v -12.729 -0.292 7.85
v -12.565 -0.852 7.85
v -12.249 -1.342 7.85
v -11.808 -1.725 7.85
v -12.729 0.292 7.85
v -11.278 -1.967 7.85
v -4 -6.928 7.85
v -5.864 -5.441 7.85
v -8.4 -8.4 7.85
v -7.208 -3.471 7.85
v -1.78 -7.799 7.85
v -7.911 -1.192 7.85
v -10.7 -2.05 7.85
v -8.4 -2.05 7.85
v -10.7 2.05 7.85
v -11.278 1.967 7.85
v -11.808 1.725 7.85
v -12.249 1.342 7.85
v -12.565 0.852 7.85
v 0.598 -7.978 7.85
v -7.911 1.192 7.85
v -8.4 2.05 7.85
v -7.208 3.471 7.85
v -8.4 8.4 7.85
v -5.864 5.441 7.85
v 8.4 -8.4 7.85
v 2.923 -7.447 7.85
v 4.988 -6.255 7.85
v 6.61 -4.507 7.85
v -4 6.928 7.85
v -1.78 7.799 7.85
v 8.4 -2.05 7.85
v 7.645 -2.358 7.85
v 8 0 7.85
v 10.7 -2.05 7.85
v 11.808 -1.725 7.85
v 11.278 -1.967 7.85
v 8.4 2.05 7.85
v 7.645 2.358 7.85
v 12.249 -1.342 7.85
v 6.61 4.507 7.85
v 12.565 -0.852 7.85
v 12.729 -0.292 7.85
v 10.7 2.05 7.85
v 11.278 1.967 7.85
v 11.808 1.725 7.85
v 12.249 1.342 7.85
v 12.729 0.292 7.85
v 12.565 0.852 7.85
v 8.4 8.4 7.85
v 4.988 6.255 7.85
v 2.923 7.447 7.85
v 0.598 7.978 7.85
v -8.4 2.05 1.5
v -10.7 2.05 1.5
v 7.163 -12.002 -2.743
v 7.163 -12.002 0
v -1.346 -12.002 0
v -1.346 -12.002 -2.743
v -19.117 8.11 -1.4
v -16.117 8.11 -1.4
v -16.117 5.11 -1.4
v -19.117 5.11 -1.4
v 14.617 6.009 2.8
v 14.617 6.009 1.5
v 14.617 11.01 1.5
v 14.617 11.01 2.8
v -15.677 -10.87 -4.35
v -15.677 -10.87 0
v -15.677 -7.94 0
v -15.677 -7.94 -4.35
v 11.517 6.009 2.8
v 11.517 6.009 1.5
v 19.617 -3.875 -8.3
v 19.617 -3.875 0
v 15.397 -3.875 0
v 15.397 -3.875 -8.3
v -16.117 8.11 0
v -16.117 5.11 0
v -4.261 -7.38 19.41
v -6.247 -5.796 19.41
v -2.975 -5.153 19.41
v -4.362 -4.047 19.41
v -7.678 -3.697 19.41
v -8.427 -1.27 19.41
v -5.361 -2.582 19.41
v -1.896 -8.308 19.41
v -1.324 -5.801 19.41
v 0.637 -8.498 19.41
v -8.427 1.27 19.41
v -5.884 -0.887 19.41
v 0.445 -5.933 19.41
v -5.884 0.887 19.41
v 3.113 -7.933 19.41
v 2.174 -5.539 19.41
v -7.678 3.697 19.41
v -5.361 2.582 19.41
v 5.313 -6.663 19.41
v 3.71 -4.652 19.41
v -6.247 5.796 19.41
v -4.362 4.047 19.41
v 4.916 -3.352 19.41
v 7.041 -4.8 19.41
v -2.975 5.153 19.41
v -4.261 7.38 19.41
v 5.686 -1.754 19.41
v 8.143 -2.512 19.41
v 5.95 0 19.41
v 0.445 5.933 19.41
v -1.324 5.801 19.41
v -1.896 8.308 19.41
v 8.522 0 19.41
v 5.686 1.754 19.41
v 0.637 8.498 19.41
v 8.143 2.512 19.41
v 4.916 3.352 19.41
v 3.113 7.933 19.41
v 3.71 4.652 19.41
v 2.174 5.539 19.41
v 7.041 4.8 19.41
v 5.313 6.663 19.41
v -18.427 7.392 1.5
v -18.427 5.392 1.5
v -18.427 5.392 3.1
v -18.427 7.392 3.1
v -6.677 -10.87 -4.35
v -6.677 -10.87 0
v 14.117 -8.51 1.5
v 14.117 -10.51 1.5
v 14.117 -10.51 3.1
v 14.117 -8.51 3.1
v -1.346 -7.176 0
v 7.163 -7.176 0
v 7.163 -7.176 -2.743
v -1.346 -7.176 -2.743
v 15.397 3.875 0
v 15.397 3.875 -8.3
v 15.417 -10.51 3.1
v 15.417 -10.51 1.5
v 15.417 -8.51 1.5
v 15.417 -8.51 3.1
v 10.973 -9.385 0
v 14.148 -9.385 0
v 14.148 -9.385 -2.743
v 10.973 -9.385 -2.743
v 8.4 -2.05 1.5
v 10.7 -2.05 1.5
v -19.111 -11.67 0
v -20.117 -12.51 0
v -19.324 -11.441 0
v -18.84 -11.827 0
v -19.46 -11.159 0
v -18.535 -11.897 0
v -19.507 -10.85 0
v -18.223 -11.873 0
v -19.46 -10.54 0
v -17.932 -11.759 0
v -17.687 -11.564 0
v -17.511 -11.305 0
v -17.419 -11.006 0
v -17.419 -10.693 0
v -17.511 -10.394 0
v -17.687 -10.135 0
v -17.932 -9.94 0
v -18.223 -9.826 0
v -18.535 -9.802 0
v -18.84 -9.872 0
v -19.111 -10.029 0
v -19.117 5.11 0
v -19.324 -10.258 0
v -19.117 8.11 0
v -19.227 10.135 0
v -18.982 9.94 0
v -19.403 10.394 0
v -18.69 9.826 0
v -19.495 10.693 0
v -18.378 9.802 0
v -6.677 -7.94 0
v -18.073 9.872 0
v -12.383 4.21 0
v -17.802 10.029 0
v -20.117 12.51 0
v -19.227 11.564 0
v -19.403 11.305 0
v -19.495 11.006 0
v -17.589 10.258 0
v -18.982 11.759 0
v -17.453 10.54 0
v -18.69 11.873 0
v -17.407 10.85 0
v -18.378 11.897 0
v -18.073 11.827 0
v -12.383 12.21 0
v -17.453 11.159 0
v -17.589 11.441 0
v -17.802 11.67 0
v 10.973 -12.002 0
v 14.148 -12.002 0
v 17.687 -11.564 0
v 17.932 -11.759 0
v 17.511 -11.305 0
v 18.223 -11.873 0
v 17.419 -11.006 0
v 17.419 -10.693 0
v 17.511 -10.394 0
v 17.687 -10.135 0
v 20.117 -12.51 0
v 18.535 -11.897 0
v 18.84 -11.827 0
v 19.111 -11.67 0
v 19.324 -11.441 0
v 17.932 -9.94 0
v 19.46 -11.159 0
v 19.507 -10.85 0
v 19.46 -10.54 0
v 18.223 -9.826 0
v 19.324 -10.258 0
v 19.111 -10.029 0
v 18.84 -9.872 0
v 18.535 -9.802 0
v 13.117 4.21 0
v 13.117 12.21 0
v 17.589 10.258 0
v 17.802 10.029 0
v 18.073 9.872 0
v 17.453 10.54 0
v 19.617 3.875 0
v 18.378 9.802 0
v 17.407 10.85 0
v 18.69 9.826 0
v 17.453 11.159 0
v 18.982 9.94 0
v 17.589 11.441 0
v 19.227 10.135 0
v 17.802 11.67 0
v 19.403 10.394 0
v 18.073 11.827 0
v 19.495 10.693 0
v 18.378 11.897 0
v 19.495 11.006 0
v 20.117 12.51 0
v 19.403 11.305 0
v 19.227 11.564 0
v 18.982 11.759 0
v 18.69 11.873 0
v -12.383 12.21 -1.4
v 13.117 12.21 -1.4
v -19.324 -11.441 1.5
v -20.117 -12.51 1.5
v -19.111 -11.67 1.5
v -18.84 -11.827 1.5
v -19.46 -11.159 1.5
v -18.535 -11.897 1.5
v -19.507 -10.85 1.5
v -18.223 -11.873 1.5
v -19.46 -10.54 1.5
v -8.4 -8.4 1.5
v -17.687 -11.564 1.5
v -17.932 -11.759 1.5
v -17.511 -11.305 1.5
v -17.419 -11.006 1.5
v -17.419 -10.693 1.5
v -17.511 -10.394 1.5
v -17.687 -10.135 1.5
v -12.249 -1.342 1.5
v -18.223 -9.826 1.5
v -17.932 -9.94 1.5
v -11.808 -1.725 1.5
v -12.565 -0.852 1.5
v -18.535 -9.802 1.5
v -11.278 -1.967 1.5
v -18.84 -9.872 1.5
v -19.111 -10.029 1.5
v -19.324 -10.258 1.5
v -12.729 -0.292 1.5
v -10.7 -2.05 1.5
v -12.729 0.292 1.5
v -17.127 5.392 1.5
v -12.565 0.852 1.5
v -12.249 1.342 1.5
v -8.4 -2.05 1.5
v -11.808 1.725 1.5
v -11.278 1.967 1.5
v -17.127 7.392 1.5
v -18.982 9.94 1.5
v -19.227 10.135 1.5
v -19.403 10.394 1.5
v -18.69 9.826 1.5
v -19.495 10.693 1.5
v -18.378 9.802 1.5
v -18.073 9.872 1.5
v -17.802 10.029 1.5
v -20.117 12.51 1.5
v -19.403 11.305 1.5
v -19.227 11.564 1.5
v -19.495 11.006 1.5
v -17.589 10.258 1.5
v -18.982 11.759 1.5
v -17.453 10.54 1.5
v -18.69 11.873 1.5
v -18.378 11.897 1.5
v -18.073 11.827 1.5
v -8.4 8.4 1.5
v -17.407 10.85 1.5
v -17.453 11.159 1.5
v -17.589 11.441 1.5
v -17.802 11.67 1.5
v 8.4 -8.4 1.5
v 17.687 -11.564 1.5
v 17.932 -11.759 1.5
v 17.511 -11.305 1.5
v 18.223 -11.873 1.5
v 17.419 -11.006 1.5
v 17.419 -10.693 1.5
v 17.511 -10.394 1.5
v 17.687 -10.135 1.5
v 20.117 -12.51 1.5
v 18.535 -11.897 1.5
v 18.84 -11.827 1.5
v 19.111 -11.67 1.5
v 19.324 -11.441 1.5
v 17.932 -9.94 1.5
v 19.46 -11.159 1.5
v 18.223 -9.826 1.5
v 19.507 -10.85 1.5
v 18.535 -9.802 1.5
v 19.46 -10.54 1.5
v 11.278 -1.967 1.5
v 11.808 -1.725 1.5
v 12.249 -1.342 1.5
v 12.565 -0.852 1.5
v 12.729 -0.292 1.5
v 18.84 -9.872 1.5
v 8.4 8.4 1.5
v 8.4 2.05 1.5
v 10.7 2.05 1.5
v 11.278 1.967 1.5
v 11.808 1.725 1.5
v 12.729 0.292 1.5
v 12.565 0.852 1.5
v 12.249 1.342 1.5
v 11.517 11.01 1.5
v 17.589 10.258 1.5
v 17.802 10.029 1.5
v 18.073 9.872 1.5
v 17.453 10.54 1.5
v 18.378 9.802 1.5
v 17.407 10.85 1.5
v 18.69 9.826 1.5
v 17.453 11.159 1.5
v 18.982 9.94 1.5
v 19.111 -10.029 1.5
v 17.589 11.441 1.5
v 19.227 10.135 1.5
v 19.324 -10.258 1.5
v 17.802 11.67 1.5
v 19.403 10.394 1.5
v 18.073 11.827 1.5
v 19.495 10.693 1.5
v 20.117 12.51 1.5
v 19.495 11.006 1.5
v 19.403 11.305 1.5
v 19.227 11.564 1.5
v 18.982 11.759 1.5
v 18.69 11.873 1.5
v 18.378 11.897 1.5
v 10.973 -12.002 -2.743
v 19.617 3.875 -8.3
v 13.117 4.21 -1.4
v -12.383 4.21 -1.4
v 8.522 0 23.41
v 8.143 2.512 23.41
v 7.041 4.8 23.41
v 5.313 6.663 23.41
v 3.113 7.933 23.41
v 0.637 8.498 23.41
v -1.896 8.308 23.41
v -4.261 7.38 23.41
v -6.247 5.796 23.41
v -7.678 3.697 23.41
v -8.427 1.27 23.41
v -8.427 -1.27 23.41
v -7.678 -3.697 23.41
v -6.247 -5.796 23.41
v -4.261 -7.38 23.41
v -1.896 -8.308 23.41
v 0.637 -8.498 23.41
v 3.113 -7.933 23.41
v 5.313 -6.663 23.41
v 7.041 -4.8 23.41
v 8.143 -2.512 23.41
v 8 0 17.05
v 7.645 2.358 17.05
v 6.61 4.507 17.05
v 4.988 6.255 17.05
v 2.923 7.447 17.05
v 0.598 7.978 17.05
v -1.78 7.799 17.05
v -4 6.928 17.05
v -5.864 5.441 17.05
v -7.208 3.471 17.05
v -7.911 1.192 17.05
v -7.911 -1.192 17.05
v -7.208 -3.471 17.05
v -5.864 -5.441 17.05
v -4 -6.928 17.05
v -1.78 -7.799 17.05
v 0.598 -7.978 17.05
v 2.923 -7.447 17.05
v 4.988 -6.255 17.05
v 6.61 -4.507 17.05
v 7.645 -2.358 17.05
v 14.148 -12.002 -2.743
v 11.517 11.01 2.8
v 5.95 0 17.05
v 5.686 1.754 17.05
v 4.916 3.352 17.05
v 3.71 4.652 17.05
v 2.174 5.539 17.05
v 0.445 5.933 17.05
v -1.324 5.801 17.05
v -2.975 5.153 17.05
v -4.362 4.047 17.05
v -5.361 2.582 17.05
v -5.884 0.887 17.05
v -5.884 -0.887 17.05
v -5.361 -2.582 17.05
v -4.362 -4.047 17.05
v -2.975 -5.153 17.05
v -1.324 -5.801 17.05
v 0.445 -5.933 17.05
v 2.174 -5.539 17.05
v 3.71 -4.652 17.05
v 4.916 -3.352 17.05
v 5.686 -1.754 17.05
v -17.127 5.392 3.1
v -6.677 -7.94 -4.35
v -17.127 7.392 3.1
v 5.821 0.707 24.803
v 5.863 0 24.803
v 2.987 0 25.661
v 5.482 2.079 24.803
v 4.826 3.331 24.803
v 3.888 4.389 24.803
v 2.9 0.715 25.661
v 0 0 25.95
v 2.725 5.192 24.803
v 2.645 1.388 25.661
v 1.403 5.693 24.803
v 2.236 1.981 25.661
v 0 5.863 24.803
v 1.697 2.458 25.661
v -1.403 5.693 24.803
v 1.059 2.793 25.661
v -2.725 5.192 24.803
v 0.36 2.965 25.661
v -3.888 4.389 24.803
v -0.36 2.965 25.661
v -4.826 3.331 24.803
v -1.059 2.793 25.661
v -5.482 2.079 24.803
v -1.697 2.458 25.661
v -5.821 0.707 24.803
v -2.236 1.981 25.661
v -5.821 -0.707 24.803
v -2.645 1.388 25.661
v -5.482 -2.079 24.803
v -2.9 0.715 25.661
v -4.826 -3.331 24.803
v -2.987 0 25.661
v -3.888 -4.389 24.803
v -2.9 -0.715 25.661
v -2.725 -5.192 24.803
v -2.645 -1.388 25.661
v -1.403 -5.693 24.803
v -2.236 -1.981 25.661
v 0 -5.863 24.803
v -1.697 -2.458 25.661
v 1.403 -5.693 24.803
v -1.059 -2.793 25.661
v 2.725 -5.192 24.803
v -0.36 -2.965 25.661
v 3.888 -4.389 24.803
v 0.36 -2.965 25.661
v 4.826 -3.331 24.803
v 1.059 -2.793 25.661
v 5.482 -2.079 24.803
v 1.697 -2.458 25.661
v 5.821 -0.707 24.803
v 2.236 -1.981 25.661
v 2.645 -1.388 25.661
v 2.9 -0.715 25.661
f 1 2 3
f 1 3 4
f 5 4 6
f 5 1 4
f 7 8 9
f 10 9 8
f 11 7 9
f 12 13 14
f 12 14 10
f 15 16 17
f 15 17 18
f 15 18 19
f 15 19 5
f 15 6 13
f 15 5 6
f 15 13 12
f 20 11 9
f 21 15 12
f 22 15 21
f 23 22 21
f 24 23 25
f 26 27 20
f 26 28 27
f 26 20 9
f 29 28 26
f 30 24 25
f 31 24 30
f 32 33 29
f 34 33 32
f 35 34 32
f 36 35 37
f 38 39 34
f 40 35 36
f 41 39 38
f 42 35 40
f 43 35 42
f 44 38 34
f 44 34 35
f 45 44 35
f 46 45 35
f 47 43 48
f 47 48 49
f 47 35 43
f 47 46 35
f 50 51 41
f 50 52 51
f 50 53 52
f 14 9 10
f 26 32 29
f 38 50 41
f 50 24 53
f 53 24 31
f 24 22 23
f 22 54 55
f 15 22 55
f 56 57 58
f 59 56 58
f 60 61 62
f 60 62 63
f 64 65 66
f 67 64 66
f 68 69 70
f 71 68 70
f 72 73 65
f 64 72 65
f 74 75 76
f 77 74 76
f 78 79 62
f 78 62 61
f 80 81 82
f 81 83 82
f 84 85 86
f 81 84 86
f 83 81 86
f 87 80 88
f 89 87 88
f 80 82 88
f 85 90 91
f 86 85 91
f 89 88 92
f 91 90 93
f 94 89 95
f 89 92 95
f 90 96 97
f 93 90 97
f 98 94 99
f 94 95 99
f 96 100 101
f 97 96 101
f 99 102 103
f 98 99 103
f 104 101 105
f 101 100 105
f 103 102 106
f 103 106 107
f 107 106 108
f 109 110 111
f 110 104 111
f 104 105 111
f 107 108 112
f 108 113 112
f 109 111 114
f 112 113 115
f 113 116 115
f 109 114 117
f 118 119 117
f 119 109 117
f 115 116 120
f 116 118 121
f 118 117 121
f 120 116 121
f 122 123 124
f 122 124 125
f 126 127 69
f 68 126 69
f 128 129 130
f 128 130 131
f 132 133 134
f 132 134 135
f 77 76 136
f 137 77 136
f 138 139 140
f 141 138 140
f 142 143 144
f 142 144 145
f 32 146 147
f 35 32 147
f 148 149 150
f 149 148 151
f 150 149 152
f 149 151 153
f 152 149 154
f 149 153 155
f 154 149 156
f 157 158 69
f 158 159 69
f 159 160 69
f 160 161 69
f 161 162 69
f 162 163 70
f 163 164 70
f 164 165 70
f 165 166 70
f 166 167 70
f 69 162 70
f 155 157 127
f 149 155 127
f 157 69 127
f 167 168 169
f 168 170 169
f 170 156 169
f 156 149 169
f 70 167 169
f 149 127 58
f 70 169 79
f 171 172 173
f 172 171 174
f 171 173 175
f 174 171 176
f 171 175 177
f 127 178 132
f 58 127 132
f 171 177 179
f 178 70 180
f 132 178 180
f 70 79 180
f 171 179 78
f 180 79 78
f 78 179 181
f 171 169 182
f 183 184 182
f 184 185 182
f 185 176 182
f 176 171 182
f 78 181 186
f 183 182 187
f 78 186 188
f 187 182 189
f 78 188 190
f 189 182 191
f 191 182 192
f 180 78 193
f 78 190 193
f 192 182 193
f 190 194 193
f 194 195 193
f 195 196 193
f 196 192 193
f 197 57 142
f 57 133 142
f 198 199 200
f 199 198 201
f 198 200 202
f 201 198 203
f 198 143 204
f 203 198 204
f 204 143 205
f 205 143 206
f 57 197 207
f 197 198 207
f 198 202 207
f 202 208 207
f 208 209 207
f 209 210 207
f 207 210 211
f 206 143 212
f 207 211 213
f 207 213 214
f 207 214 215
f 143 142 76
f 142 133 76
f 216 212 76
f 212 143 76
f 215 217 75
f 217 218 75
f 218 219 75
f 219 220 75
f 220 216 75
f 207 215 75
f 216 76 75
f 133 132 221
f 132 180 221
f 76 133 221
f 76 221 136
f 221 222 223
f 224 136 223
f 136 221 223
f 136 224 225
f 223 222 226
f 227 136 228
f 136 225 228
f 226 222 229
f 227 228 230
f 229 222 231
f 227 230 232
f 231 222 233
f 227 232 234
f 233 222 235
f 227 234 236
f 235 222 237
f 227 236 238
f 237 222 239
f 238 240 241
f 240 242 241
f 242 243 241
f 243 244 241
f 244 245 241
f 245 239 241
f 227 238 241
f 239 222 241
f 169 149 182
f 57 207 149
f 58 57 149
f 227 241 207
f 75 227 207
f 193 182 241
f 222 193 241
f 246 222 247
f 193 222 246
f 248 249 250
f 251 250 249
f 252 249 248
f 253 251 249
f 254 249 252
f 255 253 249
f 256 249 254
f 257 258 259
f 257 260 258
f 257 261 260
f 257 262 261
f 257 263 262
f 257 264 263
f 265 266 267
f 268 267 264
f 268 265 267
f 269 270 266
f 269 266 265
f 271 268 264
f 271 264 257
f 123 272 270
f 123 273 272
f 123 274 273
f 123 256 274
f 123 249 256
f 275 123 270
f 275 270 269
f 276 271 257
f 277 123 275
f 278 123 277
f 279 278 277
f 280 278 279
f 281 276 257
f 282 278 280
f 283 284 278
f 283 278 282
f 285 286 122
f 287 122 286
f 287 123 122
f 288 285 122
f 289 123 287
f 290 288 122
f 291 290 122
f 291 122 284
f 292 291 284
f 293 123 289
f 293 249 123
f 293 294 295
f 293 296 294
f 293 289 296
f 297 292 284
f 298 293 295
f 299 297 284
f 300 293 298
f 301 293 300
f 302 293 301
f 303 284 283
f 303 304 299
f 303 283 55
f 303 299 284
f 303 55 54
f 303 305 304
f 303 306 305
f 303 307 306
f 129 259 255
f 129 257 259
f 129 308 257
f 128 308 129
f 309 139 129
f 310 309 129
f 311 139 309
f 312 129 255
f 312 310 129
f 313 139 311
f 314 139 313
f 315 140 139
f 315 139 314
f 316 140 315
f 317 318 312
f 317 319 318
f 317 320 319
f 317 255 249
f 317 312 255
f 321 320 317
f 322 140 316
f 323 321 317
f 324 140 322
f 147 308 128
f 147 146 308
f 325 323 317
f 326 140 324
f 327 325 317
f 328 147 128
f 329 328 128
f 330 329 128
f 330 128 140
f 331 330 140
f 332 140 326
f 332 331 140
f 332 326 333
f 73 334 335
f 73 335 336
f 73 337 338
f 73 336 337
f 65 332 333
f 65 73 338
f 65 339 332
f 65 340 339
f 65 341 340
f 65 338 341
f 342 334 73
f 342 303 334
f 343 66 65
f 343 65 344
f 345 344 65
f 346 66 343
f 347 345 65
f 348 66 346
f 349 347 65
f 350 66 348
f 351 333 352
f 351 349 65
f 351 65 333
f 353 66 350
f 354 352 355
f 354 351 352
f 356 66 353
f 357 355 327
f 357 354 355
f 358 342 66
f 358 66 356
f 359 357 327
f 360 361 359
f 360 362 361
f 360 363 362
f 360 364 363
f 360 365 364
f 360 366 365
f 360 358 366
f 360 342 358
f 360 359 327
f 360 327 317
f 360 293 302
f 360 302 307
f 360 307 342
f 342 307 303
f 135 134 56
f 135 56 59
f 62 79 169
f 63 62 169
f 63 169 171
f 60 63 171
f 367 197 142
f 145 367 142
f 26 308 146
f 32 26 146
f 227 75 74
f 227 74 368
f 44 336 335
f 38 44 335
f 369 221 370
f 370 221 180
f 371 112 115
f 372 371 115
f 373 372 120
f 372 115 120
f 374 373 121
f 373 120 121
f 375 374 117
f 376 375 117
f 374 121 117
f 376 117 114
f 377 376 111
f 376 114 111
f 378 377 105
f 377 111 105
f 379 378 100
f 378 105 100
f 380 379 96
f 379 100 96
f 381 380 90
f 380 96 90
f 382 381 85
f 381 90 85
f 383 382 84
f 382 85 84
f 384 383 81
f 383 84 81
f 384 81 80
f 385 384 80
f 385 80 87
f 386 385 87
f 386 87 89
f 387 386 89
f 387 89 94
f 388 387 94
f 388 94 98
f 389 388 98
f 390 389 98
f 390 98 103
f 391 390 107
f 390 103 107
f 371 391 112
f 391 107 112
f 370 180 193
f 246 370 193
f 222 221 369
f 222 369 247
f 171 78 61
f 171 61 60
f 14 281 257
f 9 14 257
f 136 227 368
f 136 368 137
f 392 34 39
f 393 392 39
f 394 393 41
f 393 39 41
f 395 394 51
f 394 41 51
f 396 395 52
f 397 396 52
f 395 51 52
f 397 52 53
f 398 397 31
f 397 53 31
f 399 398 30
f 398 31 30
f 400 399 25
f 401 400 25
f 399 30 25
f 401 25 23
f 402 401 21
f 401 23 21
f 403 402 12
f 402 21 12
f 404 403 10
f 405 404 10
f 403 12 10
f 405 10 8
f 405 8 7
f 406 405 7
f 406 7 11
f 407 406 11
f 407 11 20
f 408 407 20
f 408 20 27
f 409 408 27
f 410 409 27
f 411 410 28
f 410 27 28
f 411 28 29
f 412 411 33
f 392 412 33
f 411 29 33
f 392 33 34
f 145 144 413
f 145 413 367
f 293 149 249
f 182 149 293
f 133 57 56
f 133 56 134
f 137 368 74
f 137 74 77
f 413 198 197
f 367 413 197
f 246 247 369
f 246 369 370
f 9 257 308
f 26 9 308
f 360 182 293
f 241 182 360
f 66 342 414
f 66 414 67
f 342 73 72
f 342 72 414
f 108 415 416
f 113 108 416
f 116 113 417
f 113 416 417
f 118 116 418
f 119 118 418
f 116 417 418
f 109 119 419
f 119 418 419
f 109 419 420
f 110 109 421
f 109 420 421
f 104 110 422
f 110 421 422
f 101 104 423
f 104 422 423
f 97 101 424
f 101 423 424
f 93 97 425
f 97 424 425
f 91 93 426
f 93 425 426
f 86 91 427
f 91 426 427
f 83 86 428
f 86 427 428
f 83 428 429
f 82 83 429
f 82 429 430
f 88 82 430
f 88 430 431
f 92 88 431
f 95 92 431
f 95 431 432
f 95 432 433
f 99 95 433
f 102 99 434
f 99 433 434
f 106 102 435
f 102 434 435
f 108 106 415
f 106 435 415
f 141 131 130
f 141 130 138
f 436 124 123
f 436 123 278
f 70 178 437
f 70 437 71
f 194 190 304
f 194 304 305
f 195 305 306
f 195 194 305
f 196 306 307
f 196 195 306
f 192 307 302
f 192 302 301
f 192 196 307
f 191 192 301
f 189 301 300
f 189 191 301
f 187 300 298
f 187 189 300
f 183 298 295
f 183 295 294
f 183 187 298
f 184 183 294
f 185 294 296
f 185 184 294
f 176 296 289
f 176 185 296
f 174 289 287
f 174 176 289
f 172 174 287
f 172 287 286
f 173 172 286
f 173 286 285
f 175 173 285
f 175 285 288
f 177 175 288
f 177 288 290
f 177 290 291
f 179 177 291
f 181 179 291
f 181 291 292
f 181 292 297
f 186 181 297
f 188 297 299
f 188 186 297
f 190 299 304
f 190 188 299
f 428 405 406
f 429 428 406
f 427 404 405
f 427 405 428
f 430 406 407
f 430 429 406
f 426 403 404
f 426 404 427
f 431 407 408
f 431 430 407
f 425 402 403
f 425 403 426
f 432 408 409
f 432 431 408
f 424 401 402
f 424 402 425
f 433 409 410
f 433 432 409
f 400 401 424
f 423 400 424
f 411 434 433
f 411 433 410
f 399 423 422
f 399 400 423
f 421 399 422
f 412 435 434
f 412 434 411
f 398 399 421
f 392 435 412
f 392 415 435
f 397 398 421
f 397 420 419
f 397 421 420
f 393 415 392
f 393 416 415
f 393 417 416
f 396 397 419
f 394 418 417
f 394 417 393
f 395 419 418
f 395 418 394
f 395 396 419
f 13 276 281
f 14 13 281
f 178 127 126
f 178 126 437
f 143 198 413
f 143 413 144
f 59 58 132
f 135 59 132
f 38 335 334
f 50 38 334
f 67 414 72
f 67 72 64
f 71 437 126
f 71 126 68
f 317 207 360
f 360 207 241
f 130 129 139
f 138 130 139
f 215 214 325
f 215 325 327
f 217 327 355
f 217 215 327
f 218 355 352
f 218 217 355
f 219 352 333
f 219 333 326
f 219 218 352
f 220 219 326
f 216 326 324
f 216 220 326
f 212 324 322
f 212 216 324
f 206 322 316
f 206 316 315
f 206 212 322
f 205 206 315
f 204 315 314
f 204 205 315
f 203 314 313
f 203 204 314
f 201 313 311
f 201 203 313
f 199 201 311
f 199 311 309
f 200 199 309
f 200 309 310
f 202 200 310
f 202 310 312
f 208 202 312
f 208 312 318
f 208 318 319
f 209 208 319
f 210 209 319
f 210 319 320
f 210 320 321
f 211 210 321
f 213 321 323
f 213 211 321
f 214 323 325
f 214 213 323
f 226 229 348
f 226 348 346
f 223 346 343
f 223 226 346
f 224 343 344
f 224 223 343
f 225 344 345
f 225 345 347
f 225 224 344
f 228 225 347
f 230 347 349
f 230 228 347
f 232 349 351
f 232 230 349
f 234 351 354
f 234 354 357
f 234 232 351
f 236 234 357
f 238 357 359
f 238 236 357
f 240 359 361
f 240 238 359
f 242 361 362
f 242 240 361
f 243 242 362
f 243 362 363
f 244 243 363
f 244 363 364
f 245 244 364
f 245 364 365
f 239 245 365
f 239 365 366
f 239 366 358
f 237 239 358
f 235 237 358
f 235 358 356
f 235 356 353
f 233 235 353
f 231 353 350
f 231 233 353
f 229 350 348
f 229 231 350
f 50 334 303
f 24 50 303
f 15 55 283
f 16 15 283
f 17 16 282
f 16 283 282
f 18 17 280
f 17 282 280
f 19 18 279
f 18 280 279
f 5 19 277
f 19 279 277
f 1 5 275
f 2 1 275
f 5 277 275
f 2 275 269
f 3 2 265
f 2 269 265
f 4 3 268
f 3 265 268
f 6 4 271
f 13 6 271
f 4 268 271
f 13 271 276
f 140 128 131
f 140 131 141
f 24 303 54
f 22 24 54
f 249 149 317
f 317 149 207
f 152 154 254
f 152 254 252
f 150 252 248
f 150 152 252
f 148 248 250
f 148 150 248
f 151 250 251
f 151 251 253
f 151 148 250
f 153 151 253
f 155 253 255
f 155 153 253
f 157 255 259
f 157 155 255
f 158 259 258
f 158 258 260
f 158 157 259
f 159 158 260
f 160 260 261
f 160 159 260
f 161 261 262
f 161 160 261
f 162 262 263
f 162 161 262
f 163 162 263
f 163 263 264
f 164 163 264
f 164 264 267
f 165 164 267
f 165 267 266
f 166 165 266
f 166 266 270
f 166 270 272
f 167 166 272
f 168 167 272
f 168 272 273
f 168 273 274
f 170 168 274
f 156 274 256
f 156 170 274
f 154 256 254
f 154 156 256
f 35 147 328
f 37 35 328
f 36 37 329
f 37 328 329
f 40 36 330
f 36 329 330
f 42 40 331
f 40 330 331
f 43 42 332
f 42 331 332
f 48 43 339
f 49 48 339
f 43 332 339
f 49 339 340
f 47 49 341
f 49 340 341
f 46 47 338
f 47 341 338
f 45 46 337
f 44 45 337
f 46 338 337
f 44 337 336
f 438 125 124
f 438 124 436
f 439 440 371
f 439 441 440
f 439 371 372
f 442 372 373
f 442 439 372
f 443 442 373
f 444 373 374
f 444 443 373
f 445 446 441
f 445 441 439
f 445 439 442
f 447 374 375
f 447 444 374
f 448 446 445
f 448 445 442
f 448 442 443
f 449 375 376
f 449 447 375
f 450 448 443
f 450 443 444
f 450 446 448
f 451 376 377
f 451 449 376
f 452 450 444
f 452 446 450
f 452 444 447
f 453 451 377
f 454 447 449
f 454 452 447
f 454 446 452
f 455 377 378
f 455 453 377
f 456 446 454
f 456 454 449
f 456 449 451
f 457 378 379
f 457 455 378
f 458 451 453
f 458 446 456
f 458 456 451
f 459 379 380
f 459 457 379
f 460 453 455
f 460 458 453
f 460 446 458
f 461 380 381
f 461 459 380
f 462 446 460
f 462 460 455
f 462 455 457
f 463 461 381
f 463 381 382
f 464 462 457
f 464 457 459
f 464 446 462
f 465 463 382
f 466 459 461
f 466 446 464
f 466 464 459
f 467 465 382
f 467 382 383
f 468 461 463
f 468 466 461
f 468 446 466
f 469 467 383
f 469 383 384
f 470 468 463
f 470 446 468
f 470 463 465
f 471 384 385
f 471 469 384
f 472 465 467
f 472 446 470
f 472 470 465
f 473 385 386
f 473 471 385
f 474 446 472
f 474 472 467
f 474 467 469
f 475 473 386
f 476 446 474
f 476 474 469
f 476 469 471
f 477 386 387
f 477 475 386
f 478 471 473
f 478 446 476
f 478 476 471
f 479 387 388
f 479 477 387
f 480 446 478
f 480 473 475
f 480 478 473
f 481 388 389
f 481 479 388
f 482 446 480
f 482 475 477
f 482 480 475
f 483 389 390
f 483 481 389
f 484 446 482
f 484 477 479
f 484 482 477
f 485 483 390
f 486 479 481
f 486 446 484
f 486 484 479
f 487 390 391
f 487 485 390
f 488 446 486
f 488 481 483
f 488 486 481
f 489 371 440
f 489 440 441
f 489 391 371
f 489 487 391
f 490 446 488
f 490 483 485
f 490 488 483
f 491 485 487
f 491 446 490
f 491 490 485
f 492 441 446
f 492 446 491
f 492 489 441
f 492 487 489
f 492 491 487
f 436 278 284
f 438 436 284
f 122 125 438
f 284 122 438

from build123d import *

# Parameters (mm, degrees)
SKETCH2_W            = 40.2336
SKETCH2_H            = 25.019
SKETCH2_R            = 1.05
BOSS_EXTRUDE1_DEPTH  = 1.5
BOSS_EXTRUDE2_DEPTH  = 6.35
SKETCH4_R            = 8
BOSS_EXTRUDE3_DEPTH  = 9.2
SKETCH5_R            = 5.95
BOSS_EXTRUDE4_DEPTH  = 2.36
SKETCH6_R            = 8.5217
LENS_DEPTH           = 4
SKETCH7_W            = 4.22
SKETCH7_H            = 7.75
BOSS_EXTRUDE6_DEPTH  = 8.3
SKETCH8_W            = 9
SKETCH8_H            = 2.93
BOSS_EXTRUDE7_DEPTH  = 4.35
SKETCH9_W            = 3.1
SKETCH9_H            = 5
BOSS_EXTRUDE8_DEPTH  = 1.3
SKETCH10_W           = 25.5
SKETCH10_H           = 8
BOSS_EXTRUDE9_DEPTH  = 1.4
SKETCH11_W           = 1.3
SKETCH11_H           = 2
BOSS_EXTRUDE10_DEPTH = 1.6
SKETCH12_W           = 3
SKETCH12_H           = 3
BOSS_EXTRUDE11_DEPTH = 1.4
SKETCH13_W           = 3.175
SKETCH13_H           = 2.6162
SKETCH13_W_2         = 8.509
SKETCH13_H_2         = 4.826
BOSS_EXTRUDE12_DEPTH = 2.7432
DOME1_FACE_RADIUS    = 8.5217
DOME1_HEIGHT         = 2.54


with BuildPart() as part:
    # Sketch2 → Boss-Extrude1 (new body)
    with BuildSketch(Plane.XY):
        Rectangle(SKETCH2_W, SKETCH2_H)
        with Locations((-18.4568, 10.8495)):
            Circle(SKETCH2_R, mode=Mode.SUBTRACT)
        with Locations(Location((-18.4568, -10.8495, 0), (0, 0, 180))):
            Circle(SKETCH2_R, mode=Mode.SUBTRACT)
        with Locations((18.4568, -10.8495)):
            Circle(SKETCH2_R, mode=Mode.SUBTRACT)
        with Locations(Location((18.4568, 10.8495, 0), (0, 0, 180))):
            Circle(SKETCH2_R, mode=Mode.SUBTRACT)
    extrude(amount=BOSS_EXTRUDE1_DEPTH)

    # Sketch3 → Boss-Extrude2 (add)
    with BuildSketch(Plane.XY.offset(1.5)):
        with BuildLine():
            Line((-8.4, -2.05), (-8.4, -8.4))
            Line((-8.4, -8.4), (8.4, -8.4))
            Line((8.4, -8.4), (8.4, -2.05))
            Line((8.4, -2.05), (10.7, -2.05))
            ThreePointArc((10.7, -2.05), (12.75, 0), (10.7, 2.05))
            Line((10.7, 2.05), (8.4, 2.05))
            Line((8.4, 2.05), (8.4, 8.4))
            Line((8.4, 8.4), (-8.4, 8.4))
            Line((-8.4, 8.4), (-8.4, 2.05))
            Line((-8.4, 2.05), (-10.7, 2.05))
            ThreePointArc((-10.7, 2.05), (-12.75, 0), (-10.7, -2.05))
            Line((-10.7, -2.05), (-8.4, -2.05))
        make_face()
    extrude(amount=BOSS_EXTRUDE2_DEPTH)

    # Sketch4 → Boss-Extrude3 (add)
    with BuildSketch(Plane.XY.offset(7.85)):
        Circle(SKETCH4_R)
    extrude(amount=BOSS_EXTRUDE3_DEPTH)

    # Sketch5 → Boss-Extrude4 (add)
    with BuildSketch(Plane.XY.offset(17.05)):
        Circle(SKETCH5_R)
    extrude(amount=BOSS_EXTRUDE4_DEPTH)

    # Sketch6 → Lens (add)
    with BuildSketch(Plane.XY.offset(19.41)):
        Circle(SKETCH6_R)
    extrude(amount=LENS_DEPTH)

    # Sketch7 → Boss-Extrude6 (add)
    with BuildSketch(Plane(origin=(0, 0, 0), x_dir=(-1, 0, 0), z_dir=(0, 0, -1))):
        with Locations((-17.5068, 0)):
            Rectangle(SKETCH7_W, SKETCH7_H)
    extrude(amount=BOSS_EXTRUDE6_DEPTH)

    # Sketch8 → Boss-Extrude7 (add)
    with BuildSketch(Plane(origin=(0, 0, 0), x_dir=(-1, 0, 0), z_dir=(0, 0, -1))):
        with Locations((11.1768, -9.4045)):
            Rectangle(SKETCH8_W, SKETCH8_H)
    extrude(amount=BOSS_EXTRUDE7_DEPTH)

    # Sketch9 → Boss-Extrude8 (add)
    with BuildSketch(Plane.XY.offset(1.5)):
        with Locations((13.0668, 8.5095)):
            Rectangle(SKETCH9_W, SKETCH9_H)
    extrude(amount=BOSS_EXTRUDE8_DEPTH)

    # Sketch10 → Boss-Extrude9 (add)
    with BuildSketch(Plane(origin=(0, 0, 0), x_dir=(-1, 0, 0), z_dir=(0, 0, -1))):
        with Locations((-0.3668, 8.2095)):
            Rectangle(SKETCH10_W, SKETCH10_H)
    extrude(amount=BOSS_EXTRUDE9_DEPTH)

    # Sketch11 → Boss-Extrude10 (add)
    with BuildSketch(Plane.XY.offset(1.5)):
        with Locations((14.7668, -9.5095)):
            Rectangle(SKETCH11_W, SKETCH11_H)
        with Locations((-17.777092667, 6.391636208)):
            Rectangle(SKETCH11_W, SKETCH11_H)
    extrude(amount=BOSS_EXTRUDE10_DEPTH)

    # Sketch12 → Boss-Extrude11 (add)
    with BuildSketch(Plane(origin=(0, 0, 0), x_dir=(-1, 0, 0), z_dir=(0, 0, -1))):
        with Locations((17.6168, 6.6095)):
            Rectangle(SKETCH12_W, SKETCH12_H)
    extrude(amount=BOSS_EXTRUDE11_DEPTH)

    # Sketch13 → Boss-Extrude12 (add)
    with BuildSketch(Plane(origin=(0, 0, 0), x_dir=(-1, 0, 0), z_dir=(0, 0, -1))):
        with Locations((-12.5603, -10.6934)):
            Rectangle(SKETCH13_W, SKETCH13_H)
        with Locations((-2.9083, -9.5885)):
            Rectangle(SKETCH13_W_2, SKETCH13_H_2)
    extrude(amount=BOSS_EXTRUDE12_DEPTH)

    # Dome1: a dome of height H over a round flat face of radius A is a cap of a sphere of radius (A * A + H * H) / (2 * H)
    dome1_r = (DOME1_FACE_RADIUS * DOME1_FACE_RADIUS + DOME1_HEIGHT * DOME1_HEIGHT) / (2 * DOME1_HEIGHT)
    dome1_base = Plane((0, 0, 23.41), z_dir=(0, 0, 1))
    with Locations(dome1_base.offset(DOME1_HEIGHT - dome1_r)):
        dome1_ball = Sphere(dome1_r, mode=Mode.PRIVATE)
    add(split(dome1_ball, bisect_by=dome1_base, keep=Keep.TOP, mode=Mode.PRIVATE))


solid = part.part
